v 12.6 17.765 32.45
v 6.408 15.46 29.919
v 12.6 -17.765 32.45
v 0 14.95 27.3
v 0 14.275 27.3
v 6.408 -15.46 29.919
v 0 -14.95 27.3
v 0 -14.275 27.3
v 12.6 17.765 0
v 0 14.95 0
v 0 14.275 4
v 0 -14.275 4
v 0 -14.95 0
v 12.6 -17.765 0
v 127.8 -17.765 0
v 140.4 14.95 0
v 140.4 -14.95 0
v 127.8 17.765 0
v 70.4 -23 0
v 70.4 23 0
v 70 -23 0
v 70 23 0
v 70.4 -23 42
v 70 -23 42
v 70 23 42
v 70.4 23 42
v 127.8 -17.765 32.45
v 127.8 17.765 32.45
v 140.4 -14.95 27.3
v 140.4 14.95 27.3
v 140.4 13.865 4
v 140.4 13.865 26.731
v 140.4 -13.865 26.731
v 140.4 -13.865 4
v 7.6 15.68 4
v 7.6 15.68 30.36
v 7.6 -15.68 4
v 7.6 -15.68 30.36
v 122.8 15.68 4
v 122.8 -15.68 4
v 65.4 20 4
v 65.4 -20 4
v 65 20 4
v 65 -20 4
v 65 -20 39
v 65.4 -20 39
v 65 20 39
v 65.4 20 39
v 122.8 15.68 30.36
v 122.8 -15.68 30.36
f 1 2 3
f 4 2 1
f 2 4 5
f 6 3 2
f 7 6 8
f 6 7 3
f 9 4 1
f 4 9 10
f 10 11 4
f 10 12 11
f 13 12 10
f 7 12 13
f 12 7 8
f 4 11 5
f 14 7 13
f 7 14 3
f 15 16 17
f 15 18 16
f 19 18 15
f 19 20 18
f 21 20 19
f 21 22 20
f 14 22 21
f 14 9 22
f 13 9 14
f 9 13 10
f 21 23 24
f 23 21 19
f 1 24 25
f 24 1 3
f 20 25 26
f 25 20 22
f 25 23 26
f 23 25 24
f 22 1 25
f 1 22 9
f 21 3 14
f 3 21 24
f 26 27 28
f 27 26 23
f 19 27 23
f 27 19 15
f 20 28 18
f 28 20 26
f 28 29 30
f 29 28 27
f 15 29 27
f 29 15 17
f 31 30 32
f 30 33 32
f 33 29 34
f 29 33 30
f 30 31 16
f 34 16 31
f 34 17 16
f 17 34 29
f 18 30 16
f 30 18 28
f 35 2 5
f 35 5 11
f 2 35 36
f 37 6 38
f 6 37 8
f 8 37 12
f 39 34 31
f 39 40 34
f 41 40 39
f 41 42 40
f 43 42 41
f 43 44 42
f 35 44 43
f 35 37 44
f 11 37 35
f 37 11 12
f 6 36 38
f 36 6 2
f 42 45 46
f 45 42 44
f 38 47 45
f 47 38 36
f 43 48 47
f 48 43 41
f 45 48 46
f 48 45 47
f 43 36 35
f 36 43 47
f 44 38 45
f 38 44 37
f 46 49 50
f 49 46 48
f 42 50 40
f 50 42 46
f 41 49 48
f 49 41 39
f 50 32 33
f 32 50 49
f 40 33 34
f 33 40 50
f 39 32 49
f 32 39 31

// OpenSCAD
$fn = 32;

// ----------------------------------------------------------------------
// Faired channel: 140 x 46 x 42 mm, 3 mm walls, faired ends
// ----------------------------------------------------------------------

// --- parameters (mm) ---
length = 140;             // channel length
width = 46;               // channel width at mid length
height = 42;              // channel height at mid length
wall = 3;                 // side wall thickness
floor_t = 4;              // floor thickness
end_w = 29.9;             // faired end width
end_h = 27.3;             // faired end height

difference() {
  union() {
    hull() {
      translate([0, -14.95, 0]) cube([0.4, 29.9, 27.3]);
      translate([12.6, -17.765, 0]) cube([0.4, 35.53, 32.45]);
    }
    hull() {
      translate([12.6, -17.765, 0]) cube([0.4, 35.53, 32.45]);
      translate([70, -23, 0]) cube([0.4, 46, 42]);
    }
    hull() {
      translate([70, -23, 0]) cube([0.4, 46, 42]);
      translate([127.4, -17.765, 0]) cube([0.4, 35.53, 32.45]);
    }
    hull() {
      translate([127.4, -17.765, 0]) cube([0.4, 35.53, 32.45]);
      translate([140, -14.95, 0]) cube([0.4, 29.9, 27.3]);
    }
  }
  /* cavity, 5 mm proud of both ends so the ports are cut clean */
  hull() {
    translate([-5, -13.35, 4]) cube([0.4, 26.7, 21.7]);
    translate([7.6, -15.68, 4]) cube([0.4, 31.36, 26.36]);
  }
  hull() {
    translate([7.6, -15.68, 4]) cube([0.4, 31.36, 26.36]);
    translate([65, -20, 4]) cube([0.4, 40, 35]);
  }
  hull() {
    translate([65, -20, 4]) cube([0.4, 40, 35]);
    translate([122.4, -15.68, 4]) cube([0.4, 31.36, 26.36]);
  }
  hull() {
    translate([122.4, -15.68, 4]) cube([0.4, 31.36, 26.36]);
    translate([145, -13.35, 4]) cube([0.4, 26.7, 21.7]);
  }
}
